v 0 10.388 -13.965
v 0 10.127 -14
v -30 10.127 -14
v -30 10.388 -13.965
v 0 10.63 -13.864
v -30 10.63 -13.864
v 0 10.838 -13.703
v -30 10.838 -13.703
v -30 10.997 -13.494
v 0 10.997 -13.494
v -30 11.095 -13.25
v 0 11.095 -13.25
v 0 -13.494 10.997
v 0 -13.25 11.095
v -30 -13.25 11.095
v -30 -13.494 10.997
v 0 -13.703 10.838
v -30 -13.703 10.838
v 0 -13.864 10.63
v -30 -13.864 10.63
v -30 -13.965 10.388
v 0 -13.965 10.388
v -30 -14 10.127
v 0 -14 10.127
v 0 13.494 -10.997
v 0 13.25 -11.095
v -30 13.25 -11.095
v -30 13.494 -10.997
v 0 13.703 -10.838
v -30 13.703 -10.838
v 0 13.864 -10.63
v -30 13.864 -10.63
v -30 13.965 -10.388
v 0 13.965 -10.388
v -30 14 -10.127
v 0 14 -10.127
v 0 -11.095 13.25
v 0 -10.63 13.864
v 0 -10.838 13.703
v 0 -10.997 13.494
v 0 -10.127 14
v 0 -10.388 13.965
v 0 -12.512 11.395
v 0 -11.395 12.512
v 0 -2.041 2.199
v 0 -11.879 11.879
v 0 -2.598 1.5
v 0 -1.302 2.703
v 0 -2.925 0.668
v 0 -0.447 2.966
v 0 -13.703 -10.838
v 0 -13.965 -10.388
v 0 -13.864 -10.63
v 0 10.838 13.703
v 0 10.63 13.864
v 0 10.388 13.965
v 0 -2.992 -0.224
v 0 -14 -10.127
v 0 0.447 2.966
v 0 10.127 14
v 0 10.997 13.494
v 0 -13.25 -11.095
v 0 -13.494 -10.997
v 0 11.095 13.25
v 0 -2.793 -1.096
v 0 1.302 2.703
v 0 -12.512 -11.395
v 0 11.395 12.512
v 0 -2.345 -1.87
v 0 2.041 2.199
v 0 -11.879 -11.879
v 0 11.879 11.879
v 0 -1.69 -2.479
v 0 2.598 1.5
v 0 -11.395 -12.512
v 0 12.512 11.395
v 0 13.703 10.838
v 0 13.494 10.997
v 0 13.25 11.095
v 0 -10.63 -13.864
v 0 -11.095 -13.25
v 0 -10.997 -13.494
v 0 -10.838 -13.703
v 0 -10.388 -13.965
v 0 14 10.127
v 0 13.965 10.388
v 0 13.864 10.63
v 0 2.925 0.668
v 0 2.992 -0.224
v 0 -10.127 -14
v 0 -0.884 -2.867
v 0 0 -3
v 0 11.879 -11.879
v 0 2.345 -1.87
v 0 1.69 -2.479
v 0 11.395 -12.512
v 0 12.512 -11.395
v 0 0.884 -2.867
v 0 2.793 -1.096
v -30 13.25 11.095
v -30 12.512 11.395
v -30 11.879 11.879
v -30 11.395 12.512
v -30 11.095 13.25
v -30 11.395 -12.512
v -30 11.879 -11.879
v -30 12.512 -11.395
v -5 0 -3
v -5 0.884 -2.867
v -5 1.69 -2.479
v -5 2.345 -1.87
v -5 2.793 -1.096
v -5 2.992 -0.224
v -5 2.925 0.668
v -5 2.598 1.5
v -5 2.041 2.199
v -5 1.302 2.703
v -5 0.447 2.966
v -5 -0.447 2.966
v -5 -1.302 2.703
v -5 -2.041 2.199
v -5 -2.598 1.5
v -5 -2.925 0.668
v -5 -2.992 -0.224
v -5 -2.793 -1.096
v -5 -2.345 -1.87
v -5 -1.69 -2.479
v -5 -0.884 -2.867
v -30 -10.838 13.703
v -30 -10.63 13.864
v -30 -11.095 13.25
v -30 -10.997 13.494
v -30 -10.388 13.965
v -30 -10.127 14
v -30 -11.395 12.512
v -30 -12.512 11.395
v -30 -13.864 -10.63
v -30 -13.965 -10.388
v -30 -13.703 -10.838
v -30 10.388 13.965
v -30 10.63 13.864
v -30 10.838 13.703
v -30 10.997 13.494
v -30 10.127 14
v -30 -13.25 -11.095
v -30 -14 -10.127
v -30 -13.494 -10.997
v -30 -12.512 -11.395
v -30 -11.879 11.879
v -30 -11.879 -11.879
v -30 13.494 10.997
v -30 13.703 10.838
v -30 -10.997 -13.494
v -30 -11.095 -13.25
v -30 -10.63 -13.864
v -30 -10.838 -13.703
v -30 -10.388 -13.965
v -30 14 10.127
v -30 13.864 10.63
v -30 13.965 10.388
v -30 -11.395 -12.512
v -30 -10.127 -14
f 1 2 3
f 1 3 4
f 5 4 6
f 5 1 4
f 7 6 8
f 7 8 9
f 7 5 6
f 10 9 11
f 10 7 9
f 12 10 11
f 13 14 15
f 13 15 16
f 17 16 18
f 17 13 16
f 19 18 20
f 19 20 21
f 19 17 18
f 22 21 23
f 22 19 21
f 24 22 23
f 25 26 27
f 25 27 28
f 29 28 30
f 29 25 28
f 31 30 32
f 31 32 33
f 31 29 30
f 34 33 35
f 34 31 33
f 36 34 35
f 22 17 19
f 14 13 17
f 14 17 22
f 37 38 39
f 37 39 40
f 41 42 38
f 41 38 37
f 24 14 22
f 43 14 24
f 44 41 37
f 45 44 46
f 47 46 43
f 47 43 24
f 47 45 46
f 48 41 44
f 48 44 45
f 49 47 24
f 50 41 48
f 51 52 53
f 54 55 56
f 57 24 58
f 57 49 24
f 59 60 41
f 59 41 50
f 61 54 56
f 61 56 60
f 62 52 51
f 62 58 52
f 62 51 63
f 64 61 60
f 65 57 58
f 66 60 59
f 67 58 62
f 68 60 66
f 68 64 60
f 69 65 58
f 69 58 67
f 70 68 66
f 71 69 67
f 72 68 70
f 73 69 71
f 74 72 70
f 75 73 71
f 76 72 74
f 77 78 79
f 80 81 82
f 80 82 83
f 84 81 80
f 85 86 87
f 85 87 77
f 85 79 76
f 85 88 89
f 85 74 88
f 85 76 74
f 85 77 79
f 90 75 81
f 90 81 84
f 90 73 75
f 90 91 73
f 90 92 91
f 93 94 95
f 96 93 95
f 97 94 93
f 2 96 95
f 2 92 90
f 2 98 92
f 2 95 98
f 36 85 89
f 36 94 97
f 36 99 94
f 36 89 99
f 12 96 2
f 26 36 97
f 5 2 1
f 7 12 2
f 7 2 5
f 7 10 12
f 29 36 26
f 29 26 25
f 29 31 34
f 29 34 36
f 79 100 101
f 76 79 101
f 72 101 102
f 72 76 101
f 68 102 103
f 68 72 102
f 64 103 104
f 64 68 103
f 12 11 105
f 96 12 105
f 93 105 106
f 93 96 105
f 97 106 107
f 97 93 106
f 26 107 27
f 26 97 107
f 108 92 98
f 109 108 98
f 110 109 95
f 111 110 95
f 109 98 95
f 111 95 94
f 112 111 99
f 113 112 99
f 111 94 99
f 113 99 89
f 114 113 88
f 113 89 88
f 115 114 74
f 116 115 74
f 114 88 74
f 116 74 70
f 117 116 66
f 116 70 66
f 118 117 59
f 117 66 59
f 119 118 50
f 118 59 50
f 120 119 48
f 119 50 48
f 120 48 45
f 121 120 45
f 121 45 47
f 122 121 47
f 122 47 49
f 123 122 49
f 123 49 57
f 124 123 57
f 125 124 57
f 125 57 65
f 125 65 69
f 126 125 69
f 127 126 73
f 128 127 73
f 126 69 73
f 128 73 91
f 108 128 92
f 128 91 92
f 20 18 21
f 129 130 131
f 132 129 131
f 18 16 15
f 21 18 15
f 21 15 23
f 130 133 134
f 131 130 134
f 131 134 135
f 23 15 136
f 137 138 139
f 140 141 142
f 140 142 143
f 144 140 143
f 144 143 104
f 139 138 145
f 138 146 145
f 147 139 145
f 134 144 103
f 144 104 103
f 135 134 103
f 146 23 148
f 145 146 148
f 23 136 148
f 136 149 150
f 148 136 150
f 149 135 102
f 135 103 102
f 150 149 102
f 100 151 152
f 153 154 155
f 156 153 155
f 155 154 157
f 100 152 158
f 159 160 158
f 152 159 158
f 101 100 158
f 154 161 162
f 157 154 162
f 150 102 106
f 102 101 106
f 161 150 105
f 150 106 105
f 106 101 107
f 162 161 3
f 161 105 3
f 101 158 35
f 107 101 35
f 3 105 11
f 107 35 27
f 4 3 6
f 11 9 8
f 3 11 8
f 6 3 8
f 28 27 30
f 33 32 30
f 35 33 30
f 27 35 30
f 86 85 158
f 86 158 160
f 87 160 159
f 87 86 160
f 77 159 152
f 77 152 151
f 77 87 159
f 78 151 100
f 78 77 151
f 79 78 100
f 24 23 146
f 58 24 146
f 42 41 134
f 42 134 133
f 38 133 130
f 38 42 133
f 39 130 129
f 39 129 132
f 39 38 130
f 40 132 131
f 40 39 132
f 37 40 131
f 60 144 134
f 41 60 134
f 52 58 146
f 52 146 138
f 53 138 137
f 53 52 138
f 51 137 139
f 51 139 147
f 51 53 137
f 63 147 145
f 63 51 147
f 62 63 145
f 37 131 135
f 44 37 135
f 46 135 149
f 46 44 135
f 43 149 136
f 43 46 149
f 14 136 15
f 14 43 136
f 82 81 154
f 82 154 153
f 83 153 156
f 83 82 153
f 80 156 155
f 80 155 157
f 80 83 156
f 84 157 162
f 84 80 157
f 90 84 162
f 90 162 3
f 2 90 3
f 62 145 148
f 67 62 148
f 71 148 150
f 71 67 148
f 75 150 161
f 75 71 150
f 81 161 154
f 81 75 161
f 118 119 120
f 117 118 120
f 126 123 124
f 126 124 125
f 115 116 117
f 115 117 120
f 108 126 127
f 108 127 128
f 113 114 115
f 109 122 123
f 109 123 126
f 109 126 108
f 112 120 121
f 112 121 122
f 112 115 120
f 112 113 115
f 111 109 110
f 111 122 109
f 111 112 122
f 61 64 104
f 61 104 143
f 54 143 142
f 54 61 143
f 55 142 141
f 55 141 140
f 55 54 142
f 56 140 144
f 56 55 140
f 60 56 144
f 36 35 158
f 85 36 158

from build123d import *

# Parameters (mm, degrees)
EXTRUDE_1_DEPTH     = 30
SKETCH_2_R          = 3
CUT_EXTRUDE_1_DEPTH = 5


with BuildPart() as part:
    # 草图1 → 凸台-拉伸1 (new body)
    with BuildSketch(Plane(origin=(0, 0, 0), x_dir=(0, 0, -1), z_dir=(1, 0, 0))):
        with BuildLine():
            Line((-14, 10.127016654), (-14, -10.127016654))
            ThreePointArc((-14, -10.127016654), (-13.790569415, -10.739389089), (-13.25, -11.09526249))
            ThreePointArc((-13.25, -11.09526249), (-11.878679656, -11.878679656), (-11.09526249, -13.25))
            ThreePointArc((-11.09526249, -13.25), (-10.739389089, -13.790569415), (-10.127016654, -14))
            Line((-10.127016654, -14), (10.127016654, -14))
            ThreePointArc((10.127016654, -14), (10.739389089, -13.790569415), (11.09526249, -13.25))
            ThreePointArc((11.09526249, -13.25), (11.878679656, -11.878679656), (13.25, -11.09526249))
            ThreePointArc((13.25, -11.09526249), (13.790569415, -10.739389089), (14, -10.127016654))
            Line((14, -10.127016654), (14, 10.127016654))
            ThreePointArc((14, 10.127016654), (13.790569415, 10.739389089), (13.25, 11.09526249))
            ThreePointArc((13.25, 11.09526249), (11.878679656, 11.878679656), (11.09526249, 13.25))
            ThreePointArc((11.09526249, 13.25), (10.739389089, 13.790569415), (10.127016654, 14))
            Line((10.127016654, 14), (-10.127016654, 14))
            ThreePointArc((-10.127016654, 14), (-10.739389089, 13.790569415), (-11.09526249, 13.25))
            ThreePointArc((-11.09526249, 13.25), (-11.878679656, 11.878679656), (-13.25, 11.09526249))
            ThreePointArc((-13.25, 11.09526249), (-13.790569415, 10.739389089), (-14, 10.127016654))
        make_face()
    extrude(amount=-EXTRUDE_1_DEPTH)

    # 草图2 → 切除-拉伸1 (cut)
    with BuildSketch(Plane(origin=(0, 0, 0), x_dir=(0, 0, -1), z_dir=(1, 0, 0))):
        Circle(SKETCH_2_R)
    extrude(amount=-CUT_EXTRUDE_1_DEPTH, mode=Mode.SUBTRACT)


solid = part.part
